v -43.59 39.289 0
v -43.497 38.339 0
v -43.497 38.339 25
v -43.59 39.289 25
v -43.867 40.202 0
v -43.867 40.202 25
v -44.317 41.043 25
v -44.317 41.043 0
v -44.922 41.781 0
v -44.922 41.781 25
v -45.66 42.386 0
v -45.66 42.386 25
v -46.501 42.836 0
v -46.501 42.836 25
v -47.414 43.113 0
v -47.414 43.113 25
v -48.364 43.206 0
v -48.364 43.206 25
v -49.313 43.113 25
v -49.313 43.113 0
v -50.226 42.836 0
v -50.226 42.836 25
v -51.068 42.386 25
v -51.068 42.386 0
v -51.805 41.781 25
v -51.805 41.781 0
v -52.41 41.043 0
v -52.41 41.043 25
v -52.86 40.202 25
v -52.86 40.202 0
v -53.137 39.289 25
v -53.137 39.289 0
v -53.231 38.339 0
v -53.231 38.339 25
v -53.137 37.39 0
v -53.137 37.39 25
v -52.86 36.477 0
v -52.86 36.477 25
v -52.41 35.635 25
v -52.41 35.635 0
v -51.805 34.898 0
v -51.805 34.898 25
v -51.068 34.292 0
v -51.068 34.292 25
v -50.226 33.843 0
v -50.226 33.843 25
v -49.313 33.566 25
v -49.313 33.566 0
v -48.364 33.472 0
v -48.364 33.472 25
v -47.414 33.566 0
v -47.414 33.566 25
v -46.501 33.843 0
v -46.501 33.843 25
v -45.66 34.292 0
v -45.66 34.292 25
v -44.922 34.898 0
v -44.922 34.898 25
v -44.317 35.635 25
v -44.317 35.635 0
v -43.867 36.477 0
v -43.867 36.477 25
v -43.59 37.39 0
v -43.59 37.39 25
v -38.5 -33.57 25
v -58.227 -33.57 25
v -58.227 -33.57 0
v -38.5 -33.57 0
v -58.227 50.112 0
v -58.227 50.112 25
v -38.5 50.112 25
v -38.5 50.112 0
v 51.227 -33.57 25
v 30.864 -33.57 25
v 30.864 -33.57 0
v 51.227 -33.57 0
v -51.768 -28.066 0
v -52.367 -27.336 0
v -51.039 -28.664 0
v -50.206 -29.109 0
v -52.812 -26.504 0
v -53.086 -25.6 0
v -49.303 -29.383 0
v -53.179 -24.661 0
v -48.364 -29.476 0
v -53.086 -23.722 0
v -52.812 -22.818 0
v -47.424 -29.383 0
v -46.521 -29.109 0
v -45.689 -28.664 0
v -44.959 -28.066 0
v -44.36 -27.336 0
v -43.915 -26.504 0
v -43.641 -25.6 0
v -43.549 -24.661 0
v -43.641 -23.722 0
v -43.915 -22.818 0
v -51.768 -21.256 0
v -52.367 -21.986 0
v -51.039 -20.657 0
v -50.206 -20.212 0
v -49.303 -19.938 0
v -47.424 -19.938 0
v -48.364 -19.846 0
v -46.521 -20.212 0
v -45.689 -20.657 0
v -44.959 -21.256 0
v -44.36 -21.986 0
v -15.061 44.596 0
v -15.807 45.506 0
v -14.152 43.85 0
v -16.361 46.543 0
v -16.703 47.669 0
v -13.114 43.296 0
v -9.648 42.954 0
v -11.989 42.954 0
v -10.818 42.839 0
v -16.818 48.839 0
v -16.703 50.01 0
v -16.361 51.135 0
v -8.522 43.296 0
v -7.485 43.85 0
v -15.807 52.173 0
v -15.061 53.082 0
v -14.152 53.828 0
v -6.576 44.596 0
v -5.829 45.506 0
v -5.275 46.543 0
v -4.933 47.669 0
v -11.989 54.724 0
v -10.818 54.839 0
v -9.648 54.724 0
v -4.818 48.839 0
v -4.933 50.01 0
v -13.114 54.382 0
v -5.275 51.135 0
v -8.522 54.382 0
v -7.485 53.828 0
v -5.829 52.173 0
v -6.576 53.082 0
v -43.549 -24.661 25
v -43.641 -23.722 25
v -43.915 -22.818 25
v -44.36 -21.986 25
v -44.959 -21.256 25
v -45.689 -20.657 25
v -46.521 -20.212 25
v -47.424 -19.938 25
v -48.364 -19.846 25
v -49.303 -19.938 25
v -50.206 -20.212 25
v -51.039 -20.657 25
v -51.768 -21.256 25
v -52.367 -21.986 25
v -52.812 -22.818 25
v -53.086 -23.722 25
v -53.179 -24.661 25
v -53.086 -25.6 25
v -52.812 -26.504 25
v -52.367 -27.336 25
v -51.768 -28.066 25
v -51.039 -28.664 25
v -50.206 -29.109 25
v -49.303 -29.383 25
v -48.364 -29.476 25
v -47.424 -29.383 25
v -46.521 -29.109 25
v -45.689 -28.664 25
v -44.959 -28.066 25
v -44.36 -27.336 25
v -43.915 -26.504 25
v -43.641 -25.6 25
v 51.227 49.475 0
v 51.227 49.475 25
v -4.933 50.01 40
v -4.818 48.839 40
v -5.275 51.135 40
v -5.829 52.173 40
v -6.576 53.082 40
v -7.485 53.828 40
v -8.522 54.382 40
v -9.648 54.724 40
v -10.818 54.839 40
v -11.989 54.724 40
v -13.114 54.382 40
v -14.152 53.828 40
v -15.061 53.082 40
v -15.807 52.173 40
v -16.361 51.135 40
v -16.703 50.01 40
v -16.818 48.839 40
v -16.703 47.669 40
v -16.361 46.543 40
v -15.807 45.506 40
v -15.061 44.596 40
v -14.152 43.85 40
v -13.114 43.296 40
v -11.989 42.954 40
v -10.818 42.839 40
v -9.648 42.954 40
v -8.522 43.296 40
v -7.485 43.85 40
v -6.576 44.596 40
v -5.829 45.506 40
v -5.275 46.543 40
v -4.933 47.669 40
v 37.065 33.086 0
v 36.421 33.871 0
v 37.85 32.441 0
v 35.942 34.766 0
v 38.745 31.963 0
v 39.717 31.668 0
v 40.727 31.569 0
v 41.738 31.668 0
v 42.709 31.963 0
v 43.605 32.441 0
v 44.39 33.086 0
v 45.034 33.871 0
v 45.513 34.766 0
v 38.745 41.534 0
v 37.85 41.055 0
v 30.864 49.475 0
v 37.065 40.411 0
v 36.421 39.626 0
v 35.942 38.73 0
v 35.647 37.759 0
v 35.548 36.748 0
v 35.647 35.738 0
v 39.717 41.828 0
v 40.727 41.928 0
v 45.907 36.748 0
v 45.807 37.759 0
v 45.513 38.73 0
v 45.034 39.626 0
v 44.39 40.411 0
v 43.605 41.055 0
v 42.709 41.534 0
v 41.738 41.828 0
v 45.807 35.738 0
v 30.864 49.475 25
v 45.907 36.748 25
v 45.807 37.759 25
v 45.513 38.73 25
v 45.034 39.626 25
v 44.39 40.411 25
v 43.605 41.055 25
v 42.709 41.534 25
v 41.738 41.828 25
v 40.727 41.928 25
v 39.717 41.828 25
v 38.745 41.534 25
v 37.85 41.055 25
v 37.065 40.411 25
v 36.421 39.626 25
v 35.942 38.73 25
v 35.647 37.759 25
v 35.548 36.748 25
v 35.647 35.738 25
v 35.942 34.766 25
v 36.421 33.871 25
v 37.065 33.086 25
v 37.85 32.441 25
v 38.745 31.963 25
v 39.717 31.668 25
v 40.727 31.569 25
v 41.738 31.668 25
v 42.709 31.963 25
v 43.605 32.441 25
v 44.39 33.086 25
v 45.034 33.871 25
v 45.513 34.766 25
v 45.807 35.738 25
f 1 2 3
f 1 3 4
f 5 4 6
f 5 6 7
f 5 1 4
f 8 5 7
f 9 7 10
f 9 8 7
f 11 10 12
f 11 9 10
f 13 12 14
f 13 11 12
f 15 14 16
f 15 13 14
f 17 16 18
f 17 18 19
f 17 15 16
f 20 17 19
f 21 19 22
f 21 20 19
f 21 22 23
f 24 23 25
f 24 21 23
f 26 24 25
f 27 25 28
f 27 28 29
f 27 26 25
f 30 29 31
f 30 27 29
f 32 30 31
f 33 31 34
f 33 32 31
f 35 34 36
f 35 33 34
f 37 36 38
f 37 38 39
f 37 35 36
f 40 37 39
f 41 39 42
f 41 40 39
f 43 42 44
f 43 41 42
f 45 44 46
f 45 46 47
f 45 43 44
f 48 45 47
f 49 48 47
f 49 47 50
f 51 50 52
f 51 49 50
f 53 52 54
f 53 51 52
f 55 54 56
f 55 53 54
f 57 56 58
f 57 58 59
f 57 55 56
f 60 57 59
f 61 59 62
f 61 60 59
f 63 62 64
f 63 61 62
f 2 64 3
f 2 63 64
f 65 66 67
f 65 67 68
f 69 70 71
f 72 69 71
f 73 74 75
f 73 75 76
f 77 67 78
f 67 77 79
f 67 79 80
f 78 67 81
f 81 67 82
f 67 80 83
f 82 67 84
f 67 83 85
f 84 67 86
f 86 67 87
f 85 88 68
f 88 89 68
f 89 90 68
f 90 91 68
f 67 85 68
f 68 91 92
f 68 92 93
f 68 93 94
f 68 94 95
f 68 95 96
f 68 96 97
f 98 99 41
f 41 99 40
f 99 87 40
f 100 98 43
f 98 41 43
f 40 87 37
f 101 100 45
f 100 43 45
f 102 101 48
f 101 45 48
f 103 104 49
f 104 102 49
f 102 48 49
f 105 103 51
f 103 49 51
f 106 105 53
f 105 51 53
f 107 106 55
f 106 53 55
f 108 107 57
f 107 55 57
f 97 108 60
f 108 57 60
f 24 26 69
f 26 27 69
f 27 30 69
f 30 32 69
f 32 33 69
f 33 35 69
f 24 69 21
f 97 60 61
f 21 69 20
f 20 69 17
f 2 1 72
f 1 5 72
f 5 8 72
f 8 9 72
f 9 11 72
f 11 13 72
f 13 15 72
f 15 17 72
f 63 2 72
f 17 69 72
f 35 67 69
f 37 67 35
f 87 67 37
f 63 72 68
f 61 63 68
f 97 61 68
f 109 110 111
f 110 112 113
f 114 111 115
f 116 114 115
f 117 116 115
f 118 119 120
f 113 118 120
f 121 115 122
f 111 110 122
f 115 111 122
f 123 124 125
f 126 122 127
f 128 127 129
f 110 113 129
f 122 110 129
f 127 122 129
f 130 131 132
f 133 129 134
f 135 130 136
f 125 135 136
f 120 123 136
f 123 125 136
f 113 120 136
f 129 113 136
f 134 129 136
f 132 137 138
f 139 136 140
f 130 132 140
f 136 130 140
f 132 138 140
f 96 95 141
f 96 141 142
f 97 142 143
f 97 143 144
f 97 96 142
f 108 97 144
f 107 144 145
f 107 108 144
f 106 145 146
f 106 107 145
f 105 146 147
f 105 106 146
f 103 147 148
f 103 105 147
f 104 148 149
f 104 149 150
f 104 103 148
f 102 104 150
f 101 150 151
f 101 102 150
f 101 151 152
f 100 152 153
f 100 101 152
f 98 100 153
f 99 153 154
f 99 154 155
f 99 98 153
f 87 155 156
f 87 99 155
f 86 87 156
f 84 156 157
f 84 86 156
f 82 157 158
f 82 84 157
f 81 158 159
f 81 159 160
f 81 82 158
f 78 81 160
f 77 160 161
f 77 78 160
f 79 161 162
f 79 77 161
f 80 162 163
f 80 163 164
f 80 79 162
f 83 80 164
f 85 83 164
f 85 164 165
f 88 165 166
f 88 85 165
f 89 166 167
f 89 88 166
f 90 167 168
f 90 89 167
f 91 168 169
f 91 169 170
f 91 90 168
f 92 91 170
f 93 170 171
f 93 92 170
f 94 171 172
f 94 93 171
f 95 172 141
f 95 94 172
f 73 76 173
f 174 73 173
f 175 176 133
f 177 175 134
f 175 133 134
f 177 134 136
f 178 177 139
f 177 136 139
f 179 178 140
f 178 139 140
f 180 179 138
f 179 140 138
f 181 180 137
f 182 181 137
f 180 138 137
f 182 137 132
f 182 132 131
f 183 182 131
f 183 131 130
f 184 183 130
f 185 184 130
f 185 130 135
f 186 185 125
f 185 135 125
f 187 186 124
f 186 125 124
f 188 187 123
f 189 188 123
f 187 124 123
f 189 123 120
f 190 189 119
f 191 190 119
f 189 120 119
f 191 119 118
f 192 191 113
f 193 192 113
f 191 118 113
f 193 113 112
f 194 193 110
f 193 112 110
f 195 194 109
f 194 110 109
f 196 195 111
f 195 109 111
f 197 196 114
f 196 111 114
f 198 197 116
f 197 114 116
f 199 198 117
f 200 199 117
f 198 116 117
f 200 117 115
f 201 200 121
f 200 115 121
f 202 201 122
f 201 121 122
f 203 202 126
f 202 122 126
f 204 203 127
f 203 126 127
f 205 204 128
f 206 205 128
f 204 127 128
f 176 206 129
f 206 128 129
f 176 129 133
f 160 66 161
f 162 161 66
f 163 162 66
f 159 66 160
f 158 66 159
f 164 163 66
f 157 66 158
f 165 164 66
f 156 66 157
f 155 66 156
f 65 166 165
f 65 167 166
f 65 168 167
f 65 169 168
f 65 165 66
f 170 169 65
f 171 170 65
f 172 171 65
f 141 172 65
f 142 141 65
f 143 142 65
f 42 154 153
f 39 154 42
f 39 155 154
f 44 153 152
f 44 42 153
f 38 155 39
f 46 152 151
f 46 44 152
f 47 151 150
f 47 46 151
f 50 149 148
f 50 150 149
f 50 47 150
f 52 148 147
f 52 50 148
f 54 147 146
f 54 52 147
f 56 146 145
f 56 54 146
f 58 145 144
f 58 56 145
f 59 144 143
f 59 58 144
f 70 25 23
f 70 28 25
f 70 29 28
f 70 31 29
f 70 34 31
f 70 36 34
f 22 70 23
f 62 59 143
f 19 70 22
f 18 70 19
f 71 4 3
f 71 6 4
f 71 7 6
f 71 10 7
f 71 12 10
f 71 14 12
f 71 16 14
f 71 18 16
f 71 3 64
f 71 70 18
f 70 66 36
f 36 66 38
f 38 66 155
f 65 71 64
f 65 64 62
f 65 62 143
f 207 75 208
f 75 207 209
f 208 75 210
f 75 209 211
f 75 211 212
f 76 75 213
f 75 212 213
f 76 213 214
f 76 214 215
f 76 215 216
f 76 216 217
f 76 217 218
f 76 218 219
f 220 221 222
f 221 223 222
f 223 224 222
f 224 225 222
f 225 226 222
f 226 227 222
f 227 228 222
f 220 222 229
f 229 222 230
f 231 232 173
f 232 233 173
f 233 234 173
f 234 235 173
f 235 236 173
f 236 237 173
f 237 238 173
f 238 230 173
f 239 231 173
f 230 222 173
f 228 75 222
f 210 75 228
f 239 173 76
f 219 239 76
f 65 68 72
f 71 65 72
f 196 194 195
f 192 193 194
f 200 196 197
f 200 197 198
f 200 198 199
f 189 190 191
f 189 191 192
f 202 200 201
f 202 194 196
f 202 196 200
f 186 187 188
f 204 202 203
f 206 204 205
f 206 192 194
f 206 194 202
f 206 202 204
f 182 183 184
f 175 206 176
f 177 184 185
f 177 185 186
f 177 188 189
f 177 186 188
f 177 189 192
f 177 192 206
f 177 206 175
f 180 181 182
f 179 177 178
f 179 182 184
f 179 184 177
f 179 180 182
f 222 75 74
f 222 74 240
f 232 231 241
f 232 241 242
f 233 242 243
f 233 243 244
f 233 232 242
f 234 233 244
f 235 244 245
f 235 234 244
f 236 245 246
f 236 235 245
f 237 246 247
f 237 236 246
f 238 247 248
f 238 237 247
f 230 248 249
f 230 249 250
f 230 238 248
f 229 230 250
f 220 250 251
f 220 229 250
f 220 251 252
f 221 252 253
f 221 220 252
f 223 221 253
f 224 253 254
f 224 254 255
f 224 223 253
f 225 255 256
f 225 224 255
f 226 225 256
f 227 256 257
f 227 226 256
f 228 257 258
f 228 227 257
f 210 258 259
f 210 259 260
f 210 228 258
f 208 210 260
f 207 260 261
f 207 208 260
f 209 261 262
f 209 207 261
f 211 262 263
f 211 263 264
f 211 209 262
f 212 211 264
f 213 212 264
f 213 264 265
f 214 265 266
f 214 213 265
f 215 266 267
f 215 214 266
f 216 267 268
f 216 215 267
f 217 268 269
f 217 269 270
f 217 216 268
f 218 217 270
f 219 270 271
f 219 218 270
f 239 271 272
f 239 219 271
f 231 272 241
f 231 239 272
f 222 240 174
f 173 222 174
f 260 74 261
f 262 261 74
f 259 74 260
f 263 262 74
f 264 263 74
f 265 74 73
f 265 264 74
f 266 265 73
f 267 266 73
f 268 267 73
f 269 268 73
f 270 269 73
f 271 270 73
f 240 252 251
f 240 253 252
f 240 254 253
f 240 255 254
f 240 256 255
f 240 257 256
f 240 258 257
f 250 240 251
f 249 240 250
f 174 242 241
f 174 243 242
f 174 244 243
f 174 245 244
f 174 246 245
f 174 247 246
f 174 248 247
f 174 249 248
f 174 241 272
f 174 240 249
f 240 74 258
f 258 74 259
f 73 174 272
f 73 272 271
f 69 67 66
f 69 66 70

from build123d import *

# Parameters (mm, degrees)
F0_W     = 20.3636325896
F0_H     = 83.0454565585
F0_R     = 5.1796259742
F2_DEPTH = 25
F0_W_2   = 19.7272747755
F0_H_2   = 83.6818218231
F0_R_2   = 4.8149653707
F0_R_3   = 4.867
F1_R     = 6
F3_DEPTH = 40
F4_DEPTH = 25


with BuildPart() as f2:
    # F0 (on Top) → F2 (new body)
    with BuildSketch(Plane.XY):
        with Locations((41.0454552621, 7.9527366906)):
            Rectangle(F0_W, F0_H)
        with Locations((40.727276355, 36.7481932044)):
            Circle(F0_R, mode=Mode.SUBTRACT)
    extrude(amount=F2_DEPTH)

    # F0 (on Top) → F4 (cut, symmetric)
    with BuildSketch(Plane.XY):
        with Locations((-48.3636371791, 38.3391045034)):
            Circle(F0_R_3)
        with Locations((-48.3636371791, -24.6609002352)):
            Circle(F0_R_2)
        with Locations((40.727276355, 36.7481932044)):
            Circle(F0_R)
    extrude(amount=F4_DEPTH, both=True, mode=Mode.SUBTRACT)


with BuildPart() as f2b:
    # F0 (on Top) → F2, piece 2 (new body)
    with BuildSketch(Plane.XY):
        with Locations((-48.3636371791, 8.270919323)):
            Rectangle(F0_W_2, F0_H_2)
        with Locations((-48.3636371791, -24.6609002352)):
            Circle(F0_R_2, mode=Mode.SUBTRACT)
        with Locations((-48.3636371791, 38.3391045034)):
            Circle(F0_R_3, mode=Mode.SUBTRACT)
    extrude(amount=F2_DEPTH)


with BuildPart() as f3:
    # F1 (on Top) → F3 (new body)
    with BuildSketch(Plane.XY):
        with Locations((-10.8181824908, 48.8391034305)):
            Circle(F1_R)
    extrude(amount=F3_DEPTH)


solid = Compound([f2.part, f2b.part, f3.part])
